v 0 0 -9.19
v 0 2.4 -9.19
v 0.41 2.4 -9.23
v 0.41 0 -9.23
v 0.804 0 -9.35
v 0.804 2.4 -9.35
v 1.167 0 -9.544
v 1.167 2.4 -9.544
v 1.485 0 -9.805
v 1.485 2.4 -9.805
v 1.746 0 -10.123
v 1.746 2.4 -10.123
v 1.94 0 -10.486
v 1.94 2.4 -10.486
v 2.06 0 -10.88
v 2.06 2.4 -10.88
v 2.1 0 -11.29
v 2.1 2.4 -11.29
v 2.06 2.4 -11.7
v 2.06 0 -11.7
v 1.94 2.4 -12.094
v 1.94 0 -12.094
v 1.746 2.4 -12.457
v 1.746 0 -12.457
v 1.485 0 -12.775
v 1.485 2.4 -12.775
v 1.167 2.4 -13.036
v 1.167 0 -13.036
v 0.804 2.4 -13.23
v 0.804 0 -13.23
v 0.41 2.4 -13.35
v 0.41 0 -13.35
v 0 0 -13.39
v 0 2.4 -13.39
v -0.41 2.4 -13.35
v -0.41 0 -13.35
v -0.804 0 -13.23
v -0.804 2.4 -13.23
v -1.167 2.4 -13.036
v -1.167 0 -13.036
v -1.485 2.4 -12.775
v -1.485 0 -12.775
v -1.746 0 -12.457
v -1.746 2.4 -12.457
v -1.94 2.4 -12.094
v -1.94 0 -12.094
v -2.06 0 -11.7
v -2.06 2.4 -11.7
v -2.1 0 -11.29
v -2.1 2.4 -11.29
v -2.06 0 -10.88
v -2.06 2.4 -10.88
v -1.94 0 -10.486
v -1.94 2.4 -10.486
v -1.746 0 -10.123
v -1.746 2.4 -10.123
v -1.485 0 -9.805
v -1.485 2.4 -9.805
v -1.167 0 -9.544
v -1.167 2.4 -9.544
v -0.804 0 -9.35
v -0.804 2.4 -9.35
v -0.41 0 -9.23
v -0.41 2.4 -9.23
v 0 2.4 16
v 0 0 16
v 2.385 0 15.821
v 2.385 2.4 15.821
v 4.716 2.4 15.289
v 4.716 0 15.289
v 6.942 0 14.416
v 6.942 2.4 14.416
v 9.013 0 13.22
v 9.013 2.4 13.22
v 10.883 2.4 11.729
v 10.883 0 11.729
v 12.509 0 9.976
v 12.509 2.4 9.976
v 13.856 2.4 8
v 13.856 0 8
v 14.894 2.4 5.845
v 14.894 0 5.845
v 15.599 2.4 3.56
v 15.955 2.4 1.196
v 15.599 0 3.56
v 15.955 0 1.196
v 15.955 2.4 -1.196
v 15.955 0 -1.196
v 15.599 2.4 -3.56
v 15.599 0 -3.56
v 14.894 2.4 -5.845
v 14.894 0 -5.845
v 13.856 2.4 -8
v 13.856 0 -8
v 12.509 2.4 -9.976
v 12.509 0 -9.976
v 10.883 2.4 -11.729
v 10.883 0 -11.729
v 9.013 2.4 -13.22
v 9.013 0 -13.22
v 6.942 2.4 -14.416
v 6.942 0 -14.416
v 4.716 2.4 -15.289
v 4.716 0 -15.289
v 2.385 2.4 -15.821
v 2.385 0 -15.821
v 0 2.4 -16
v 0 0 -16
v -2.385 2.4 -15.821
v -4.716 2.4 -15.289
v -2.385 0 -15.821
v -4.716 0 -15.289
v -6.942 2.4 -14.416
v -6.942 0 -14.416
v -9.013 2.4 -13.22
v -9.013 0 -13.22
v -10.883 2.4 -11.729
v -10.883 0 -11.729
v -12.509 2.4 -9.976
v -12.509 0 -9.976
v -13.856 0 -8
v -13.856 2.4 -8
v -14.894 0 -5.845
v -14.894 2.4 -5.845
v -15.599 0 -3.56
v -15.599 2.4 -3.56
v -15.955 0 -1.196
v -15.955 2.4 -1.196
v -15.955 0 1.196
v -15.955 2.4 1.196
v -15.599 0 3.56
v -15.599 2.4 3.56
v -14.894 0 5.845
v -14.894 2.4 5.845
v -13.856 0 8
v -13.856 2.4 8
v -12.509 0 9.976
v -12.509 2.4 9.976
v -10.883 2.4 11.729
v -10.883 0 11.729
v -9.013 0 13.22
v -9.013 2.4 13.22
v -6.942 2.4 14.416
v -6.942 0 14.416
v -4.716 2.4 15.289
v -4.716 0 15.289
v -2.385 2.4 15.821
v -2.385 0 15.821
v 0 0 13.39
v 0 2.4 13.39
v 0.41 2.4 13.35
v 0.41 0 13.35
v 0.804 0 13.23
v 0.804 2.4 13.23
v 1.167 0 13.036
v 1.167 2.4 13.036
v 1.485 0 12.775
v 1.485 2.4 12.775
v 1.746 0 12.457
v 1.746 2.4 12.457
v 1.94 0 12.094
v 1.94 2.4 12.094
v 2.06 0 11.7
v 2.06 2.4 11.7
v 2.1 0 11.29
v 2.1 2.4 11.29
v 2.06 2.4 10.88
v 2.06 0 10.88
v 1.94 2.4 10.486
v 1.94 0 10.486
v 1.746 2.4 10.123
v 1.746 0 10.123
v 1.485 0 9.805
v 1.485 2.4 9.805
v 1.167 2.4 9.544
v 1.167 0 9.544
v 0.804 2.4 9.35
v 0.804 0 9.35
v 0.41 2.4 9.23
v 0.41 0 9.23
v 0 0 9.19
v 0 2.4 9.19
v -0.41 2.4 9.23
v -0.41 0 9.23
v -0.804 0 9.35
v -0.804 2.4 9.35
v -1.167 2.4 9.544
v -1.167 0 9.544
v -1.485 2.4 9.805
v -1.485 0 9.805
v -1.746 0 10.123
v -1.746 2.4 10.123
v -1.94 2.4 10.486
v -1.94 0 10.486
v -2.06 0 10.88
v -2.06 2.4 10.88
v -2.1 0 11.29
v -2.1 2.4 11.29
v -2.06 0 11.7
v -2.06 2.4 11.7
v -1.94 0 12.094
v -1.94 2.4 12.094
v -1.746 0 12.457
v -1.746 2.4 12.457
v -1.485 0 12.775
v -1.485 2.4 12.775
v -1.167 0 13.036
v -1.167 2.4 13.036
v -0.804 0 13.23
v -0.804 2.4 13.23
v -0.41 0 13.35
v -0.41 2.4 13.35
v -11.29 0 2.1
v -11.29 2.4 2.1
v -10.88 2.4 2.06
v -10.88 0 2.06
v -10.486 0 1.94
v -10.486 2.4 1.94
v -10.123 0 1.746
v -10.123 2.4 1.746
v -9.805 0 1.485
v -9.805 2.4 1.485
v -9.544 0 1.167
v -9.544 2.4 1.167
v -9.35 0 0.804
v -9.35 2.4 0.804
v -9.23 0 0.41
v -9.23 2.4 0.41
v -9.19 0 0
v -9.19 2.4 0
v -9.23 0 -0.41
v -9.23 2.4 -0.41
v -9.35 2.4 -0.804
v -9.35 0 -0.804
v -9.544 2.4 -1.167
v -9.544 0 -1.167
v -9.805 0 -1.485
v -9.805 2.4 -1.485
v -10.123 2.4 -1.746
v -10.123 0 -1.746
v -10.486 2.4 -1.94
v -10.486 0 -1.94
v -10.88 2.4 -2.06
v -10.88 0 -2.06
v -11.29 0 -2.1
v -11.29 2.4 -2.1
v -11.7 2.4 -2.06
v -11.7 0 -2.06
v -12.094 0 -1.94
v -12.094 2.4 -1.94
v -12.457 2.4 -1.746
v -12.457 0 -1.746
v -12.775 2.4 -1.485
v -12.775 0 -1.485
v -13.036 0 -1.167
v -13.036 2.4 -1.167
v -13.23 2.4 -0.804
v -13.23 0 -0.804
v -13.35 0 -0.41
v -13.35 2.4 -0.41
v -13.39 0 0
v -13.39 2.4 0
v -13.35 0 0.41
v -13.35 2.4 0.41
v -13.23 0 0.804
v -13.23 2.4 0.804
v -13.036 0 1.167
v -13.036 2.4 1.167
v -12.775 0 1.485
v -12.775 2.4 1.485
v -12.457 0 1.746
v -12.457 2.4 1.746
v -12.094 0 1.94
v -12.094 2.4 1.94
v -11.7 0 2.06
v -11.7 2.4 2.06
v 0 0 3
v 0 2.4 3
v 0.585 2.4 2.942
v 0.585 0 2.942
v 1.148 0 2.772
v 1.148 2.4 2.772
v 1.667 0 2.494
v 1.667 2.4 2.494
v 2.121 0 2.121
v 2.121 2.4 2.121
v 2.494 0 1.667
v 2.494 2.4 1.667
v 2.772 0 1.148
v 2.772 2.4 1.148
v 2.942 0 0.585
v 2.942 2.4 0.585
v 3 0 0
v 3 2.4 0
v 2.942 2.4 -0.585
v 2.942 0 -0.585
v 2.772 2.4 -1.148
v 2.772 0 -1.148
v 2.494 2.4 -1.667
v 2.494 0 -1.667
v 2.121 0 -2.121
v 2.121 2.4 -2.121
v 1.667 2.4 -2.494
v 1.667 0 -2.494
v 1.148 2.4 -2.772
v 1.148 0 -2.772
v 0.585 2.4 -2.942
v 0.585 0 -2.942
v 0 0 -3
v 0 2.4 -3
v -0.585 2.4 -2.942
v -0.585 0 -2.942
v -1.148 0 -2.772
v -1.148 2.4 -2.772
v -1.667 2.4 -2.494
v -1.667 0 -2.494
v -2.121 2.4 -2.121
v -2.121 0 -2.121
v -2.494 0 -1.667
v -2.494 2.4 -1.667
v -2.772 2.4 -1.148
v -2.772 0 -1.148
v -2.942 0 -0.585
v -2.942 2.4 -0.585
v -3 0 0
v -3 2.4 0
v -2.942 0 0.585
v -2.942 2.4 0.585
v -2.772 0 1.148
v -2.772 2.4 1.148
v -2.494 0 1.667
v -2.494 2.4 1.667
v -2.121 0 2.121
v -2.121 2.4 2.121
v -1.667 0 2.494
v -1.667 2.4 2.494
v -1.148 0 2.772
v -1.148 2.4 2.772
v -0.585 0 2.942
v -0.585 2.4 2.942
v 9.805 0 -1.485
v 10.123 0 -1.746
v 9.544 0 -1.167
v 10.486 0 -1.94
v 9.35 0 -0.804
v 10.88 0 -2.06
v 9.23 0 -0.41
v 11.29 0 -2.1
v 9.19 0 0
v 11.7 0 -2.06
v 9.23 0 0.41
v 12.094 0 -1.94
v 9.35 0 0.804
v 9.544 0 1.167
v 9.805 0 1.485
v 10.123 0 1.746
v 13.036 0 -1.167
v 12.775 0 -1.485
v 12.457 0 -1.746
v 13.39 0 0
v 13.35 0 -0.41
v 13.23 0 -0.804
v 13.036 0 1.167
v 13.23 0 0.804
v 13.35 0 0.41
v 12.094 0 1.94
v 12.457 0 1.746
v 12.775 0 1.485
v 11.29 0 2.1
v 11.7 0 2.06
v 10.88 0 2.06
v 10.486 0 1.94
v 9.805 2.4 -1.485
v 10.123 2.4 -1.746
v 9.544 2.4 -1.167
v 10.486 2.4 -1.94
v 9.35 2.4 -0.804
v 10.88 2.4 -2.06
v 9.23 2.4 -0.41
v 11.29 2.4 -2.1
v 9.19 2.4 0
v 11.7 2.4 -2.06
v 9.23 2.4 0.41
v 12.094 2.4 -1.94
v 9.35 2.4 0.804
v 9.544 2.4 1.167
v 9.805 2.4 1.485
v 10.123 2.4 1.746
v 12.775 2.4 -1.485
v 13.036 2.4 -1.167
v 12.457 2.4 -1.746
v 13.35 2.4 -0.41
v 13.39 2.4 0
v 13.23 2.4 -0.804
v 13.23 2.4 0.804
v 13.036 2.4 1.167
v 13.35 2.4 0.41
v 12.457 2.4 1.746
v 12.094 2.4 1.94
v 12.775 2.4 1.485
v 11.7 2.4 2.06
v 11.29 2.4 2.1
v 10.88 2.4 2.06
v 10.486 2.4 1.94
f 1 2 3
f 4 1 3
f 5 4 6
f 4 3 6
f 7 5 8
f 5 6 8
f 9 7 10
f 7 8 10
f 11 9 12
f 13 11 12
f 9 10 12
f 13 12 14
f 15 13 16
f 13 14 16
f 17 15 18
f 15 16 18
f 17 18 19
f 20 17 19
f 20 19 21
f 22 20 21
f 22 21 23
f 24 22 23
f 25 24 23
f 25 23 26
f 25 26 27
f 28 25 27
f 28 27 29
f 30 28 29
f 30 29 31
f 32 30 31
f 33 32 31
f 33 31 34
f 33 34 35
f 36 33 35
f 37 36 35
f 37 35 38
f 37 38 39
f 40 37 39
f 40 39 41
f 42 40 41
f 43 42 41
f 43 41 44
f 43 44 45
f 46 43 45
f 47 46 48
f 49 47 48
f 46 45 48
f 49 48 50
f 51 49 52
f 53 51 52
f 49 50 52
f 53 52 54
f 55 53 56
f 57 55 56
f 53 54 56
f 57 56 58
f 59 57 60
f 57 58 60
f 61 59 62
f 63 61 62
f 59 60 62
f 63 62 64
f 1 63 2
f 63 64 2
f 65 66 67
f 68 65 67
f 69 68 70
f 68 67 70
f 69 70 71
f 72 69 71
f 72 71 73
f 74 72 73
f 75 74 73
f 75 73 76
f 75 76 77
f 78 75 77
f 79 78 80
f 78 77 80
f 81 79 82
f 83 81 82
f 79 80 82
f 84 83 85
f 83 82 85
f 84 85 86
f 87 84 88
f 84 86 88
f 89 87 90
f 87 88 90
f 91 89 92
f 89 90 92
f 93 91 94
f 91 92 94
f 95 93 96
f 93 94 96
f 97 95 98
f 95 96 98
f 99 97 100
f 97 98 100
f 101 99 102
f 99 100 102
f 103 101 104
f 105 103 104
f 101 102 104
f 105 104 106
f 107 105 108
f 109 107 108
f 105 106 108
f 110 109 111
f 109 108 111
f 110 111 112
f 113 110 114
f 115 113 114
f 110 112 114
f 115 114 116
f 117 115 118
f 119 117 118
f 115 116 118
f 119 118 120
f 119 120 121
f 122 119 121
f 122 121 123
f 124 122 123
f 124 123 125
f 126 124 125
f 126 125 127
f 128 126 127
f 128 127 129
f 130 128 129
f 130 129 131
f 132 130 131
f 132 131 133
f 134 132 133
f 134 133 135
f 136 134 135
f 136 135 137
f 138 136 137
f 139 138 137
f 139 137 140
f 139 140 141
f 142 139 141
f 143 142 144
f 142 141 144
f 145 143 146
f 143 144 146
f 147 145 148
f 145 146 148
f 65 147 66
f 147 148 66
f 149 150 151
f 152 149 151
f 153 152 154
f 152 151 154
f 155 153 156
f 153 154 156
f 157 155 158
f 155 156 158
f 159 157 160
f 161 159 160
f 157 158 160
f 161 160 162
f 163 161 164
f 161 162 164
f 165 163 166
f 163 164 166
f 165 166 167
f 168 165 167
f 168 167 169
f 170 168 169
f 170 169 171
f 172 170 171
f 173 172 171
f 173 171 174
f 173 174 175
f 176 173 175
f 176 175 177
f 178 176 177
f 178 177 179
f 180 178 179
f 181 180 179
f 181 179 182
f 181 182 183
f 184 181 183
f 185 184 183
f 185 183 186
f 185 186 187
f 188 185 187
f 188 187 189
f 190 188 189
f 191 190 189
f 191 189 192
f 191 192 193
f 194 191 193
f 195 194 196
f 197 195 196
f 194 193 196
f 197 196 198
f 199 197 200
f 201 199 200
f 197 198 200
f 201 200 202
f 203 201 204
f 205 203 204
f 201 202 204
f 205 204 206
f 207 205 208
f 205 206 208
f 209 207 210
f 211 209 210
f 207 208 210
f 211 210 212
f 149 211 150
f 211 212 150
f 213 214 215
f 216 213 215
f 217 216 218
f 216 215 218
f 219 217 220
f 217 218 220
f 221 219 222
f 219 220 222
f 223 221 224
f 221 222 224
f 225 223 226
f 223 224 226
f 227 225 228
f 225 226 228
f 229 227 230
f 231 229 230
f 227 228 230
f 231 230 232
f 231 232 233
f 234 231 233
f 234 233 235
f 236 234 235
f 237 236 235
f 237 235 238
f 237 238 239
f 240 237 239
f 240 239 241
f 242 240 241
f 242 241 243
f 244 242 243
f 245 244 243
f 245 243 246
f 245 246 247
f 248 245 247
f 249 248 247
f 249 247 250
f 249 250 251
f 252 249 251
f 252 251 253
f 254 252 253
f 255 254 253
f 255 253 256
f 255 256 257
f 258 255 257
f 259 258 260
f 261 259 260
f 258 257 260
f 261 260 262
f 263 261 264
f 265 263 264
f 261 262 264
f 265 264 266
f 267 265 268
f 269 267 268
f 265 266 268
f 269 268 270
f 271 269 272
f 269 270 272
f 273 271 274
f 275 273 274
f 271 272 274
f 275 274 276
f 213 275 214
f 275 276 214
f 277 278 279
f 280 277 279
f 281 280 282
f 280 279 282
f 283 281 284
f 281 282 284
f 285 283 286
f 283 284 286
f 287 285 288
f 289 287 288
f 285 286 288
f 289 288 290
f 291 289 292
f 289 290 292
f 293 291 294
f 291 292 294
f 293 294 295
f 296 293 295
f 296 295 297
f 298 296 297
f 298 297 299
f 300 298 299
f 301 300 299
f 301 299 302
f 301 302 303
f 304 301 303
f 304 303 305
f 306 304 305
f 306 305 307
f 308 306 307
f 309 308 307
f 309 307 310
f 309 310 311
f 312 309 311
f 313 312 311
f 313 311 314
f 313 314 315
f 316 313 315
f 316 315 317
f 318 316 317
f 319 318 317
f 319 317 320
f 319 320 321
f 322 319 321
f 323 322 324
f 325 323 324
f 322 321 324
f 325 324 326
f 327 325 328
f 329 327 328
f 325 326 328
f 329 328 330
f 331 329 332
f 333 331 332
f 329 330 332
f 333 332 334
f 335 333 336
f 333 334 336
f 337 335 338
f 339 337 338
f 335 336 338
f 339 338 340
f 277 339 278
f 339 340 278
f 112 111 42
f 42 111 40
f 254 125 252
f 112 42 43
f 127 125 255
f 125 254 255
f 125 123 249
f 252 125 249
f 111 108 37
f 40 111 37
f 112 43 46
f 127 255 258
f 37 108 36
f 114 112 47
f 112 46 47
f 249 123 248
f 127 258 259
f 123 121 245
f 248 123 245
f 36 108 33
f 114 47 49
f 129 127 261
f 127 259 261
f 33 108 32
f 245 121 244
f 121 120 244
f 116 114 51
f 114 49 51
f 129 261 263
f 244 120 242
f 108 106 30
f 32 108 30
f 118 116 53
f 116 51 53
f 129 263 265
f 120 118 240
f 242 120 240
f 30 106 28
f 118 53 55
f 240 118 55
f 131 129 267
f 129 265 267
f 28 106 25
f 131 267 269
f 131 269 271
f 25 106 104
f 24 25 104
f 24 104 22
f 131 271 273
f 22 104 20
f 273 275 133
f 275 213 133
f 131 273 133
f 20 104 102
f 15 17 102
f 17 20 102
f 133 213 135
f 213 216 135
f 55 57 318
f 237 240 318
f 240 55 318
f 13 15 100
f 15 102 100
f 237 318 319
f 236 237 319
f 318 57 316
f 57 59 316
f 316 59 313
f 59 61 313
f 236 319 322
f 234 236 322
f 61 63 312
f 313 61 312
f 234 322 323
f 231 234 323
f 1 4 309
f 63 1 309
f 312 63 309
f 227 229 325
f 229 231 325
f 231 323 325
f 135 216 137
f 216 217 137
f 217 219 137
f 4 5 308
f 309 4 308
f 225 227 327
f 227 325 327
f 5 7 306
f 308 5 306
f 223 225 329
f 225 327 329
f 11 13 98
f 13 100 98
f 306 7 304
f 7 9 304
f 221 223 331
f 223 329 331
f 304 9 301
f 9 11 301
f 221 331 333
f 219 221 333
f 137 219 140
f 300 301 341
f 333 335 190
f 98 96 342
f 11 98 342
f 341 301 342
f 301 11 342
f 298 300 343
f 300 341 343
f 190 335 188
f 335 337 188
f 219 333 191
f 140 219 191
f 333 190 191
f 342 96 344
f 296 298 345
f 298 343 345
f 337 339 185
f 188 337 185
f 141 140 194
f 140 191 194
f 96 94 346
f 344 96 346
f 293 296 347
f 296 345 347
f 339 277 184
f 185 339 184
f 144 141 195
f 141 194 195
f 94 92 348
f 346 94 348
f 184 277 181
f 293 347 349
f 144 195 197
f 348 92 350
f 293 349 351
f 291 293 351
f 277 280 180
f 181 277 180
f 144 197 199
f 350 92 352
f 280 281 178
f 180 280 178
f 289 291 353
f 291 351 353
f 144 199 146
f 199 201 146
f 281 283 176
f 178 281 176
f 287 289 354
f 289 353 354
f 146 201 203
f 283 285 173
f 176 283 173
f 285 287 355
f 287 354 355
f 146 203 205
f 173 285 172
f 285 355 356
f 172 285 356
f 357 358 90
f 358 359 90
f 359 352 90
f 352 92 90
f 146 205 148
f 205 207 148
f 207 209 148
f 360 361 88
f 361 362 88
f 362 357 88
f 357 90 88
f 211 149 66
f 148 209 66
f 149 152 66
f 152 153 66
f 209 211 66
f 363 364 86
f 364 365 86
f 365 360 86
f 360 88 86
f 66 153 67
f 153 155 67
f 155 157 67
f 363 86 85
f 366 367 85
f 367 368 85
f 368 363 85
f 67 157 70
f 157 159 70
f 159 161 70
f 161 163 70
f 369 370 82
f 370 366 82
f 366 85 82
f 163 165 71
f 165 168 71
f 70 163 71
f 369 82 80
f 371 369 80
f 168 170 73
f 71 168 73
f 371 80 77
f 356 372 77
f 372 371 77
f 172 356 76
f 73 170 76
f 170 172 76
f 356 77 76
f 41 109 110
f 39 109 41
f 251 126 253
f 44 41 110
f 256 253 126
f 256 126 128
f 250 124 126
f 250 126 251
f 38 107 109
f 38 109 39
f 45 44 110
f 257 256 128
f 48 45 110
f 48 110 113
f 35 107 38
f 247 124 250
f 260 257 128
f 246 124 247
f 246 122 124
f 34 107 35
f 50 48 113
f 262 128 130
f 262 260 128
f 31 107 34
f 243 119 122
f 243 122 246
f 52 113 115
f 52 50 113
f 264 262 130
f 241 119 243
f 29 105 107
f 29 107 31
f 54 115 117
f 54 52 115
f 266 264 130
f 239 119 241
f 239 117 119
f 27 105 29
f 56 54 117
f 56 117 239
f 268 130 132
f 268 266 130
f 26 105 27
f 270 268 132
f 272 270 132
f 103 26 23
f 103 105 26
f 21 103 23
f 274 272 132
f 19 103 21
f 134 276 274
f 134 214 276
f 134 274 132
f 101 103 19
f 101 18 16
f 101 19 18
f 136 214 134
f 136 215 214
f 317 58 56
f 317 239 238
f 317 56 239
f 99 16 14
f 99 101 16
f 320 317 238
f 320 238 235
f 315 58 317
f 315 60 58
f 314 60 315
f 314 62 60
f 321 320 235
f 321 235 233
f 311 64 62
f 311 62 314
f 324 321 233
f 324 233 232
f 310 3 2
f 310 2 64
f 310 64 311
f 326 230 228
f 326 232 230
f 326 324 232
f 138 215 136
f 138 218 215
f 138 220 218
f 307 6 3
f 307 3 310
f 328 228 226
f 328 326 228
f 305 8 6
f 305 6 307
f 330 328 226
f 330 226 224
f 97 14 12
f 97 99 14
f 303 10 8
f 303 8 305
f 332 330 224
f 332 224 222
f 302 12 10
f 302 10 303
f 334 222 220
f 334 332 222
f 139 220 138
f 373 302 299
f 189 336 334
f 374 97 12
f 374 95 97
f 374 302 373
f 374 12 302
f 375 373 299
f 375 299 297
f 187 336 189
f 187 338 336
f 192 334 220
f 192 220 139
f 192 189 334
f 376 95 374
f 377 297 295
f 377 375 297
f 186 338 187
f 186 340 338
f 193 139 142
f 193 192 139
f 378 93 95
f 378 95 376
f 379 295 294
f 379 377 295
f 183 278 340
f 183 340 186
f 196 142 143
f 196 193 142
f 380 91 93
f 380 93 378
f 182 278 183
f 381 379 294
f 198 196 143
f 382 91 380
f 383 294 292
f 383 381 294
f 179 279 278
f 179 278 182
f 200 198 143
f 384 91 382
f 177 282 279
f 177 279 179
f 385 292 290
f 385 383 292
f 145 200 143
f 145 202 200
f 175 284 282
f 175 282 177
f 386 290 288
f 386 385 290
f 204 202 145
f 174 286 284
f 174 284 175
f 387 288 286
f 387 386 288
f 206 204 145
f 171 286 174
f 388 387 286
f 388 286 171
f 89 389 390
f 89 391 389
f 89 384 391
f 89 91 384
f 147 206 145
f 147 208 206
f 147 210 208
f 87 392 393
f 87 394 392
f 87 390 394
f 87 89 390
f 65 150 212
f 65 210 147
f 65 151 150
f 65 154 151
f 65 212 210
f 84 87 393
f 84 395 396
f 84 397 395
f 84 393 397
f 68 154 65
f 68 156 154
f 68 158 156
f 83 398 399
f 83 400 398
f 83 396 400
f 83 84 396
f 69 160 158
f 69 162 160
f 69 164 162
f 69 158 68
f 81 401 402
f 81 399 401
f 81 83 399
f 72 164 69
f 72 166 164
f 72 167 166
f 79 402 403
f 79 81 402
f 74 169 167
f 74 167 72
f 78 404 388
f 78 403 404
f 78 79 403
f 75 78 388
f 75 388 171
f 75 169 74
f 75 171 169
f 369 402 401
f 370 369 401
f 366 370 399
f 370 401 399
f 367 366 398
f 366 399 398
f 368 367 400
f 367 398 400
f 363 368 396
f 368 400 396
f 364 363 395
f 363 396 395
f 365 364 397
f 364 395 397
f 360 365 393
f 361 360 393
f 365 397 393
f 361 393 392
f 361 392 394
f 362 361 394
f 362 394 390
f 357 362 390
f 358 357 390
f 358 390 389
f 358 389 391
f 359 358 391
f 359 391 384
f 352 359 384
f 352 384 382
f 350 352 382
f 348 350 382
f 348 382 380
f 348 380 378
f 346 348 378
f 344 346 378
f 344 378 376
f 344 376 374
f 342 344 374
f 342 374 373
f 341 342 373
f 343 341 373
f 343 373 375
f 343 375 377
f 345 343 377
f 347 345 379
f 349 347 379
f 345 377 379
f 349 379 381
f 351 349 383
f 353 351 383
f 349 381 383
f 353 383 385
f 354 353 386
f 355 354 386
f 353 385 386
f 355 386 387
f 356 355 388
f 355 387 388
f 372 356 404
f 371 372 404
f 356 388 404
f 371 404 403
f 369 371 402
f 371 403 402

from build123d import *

# Parameters (mm, degrees)
SKETCH_1_R          = 16
EXTRUDE_1_DEPTH     = 2.4
CUT_EXTRUDE_2_REACH = 24.754
SKETCH_4_R          = 2.1
CUT_EXTRUDE_3_REACH = 24.754
SKETCH_2_R          = 3


with BuildPart() as part:
    # 草圖1 → 填料-伸長1 (new body)
    with BuildSketch(Plane(origin=(0, 0, 0), x_dir=(1, 0, 0), z_dir=(0, 1, 0))):
        with Locations(Location((0, 0, 0), (0, 0, 270))):
            Circle(SKETCH_1_R)
    extrude(amount=EXTRUDE_1_DEPTH)

    # 草圖4 → 除料-伸長2 (cut, up to next)
    with BuildSketch(Plane(origin=(0, 2.4, 0), x_dir=(1, 0, 0), z_dir=(0, 1, 0)), mode=Mode.PRIVATE) as cut_extrude_2_sk1:
        with Locations(Location((0, 11.29, 0), (0, 0, 270))):
            Circle(SKETCH_4_R)
    cut_extrude_2_tool1 = extrude(cut_extrude_2_sk1.sketch, amount=-CUT_EXTRUDE_2_REACH, mode=Mode.PRIVATE) & part.part
    # 草圖4 → 除料-伸長2 (cut, up to next)
    with BuildSketch(Plane(origin=(0, 2.4, 0), x_dir=(1, 0, 0), z_dir=(0, 1, 0)), mode=Mode.PRIVATE) as cut_extrude_2_sk2:
        with Locations(Location((11.29, 0, 0), (0, 0, 270))):
            Circle(SKETCH_4_R)
    cut_extrude_2_tool2 = extrude(cut_extrude_2_sk2.sketch, amount=-CUT_EXTRUDE_2_REACH, mode=Mode.PRIVATE) & part.part
    # 草圖4 → 除料-伸長2 (cut, up to next)
    with BuildSketch(Plane(origin=(0, 2.4, 0), x_dir=(1, 0, 0), z_dir=(0, 1, 0)), mode=Mode.PRIVATE) as cut_extrude_2_sk3:
        with Locations(Location((0, -11.29, 0), (0, 0, 270))):
            Circle(SKETCH_4_R)
    cut_extrude_2_tool3 = extrude(cut_extrude_2_sk3.sketch, amount=-CUT_EXTRUDE_2_REACH, mode=Mode.PRIVATE) & part.part
    # 草圖4 → 除料-伸長2 (cut, up to next)
    with BuildSketch(Plane(origin=(0, 2.4, 0), x_dir=(1, 0, 0), z_dir=(0, 1, 0)), mode=Mode.PRIVATE) as cut_extrude_2_sk4:
        with Locations(Location((-11.29, 0, 0), (0, 0, 270))):
            Circle(SKETCH_4_R)
    cut_extrude_2_tool4 = extrude(cut_extrude_2_sk4.sketch, amount=-CUT_EXTRUDE_2_REACH, mode=Mode.PRIVATE) & part.part
    add(cut_extrude_2_tool1.solids().sort_by_distance((0, 2.4, -11.29))[0], mode=Mode.SUBTRACT)
    add(cut_extrude_2_tool2.solids().sort_by_distance((11.29, 2.4, 0))[0], mode=Mode.SUBTRACT)
    add(cut_extrude_2_tool3.solids().sort_by_distance((0, 2.4, 11.29))[0], mode=Mode.SUBTRACT)
    add(cut_extrude_2_tool4.solids().sort_by_distance((-11.29, 2.4, 0))[0], mode=Mode.SUBTRACT)

    # 草圖2 → 除料-伸長3 (cut, up to next)
    with BuildSketch(Plane(origin=(0, 2.4, 0), x_dir=(1, 0, 0), z_dir=(0, 1, 0)), mode=Mode.PRIVATE) as cut_extrude_3_sk1:
        with Locations(Location((0, 0, 0), (0, 0, 270))):
            Circle(SKETCH_2_R)
    cut_extrude_3_tool1 = extrude(cut_extrude_3_sk1.sketch, amount=-CUT_EXTRUDE_3_REACH, mode=Mode.PRIVATE) & part.part
    add(cut_extrude_3_tool1.solids().sort_by_distance((0, 2.4, 0))[0], mode=Mode.SUBTRACT)


solid = part.part
